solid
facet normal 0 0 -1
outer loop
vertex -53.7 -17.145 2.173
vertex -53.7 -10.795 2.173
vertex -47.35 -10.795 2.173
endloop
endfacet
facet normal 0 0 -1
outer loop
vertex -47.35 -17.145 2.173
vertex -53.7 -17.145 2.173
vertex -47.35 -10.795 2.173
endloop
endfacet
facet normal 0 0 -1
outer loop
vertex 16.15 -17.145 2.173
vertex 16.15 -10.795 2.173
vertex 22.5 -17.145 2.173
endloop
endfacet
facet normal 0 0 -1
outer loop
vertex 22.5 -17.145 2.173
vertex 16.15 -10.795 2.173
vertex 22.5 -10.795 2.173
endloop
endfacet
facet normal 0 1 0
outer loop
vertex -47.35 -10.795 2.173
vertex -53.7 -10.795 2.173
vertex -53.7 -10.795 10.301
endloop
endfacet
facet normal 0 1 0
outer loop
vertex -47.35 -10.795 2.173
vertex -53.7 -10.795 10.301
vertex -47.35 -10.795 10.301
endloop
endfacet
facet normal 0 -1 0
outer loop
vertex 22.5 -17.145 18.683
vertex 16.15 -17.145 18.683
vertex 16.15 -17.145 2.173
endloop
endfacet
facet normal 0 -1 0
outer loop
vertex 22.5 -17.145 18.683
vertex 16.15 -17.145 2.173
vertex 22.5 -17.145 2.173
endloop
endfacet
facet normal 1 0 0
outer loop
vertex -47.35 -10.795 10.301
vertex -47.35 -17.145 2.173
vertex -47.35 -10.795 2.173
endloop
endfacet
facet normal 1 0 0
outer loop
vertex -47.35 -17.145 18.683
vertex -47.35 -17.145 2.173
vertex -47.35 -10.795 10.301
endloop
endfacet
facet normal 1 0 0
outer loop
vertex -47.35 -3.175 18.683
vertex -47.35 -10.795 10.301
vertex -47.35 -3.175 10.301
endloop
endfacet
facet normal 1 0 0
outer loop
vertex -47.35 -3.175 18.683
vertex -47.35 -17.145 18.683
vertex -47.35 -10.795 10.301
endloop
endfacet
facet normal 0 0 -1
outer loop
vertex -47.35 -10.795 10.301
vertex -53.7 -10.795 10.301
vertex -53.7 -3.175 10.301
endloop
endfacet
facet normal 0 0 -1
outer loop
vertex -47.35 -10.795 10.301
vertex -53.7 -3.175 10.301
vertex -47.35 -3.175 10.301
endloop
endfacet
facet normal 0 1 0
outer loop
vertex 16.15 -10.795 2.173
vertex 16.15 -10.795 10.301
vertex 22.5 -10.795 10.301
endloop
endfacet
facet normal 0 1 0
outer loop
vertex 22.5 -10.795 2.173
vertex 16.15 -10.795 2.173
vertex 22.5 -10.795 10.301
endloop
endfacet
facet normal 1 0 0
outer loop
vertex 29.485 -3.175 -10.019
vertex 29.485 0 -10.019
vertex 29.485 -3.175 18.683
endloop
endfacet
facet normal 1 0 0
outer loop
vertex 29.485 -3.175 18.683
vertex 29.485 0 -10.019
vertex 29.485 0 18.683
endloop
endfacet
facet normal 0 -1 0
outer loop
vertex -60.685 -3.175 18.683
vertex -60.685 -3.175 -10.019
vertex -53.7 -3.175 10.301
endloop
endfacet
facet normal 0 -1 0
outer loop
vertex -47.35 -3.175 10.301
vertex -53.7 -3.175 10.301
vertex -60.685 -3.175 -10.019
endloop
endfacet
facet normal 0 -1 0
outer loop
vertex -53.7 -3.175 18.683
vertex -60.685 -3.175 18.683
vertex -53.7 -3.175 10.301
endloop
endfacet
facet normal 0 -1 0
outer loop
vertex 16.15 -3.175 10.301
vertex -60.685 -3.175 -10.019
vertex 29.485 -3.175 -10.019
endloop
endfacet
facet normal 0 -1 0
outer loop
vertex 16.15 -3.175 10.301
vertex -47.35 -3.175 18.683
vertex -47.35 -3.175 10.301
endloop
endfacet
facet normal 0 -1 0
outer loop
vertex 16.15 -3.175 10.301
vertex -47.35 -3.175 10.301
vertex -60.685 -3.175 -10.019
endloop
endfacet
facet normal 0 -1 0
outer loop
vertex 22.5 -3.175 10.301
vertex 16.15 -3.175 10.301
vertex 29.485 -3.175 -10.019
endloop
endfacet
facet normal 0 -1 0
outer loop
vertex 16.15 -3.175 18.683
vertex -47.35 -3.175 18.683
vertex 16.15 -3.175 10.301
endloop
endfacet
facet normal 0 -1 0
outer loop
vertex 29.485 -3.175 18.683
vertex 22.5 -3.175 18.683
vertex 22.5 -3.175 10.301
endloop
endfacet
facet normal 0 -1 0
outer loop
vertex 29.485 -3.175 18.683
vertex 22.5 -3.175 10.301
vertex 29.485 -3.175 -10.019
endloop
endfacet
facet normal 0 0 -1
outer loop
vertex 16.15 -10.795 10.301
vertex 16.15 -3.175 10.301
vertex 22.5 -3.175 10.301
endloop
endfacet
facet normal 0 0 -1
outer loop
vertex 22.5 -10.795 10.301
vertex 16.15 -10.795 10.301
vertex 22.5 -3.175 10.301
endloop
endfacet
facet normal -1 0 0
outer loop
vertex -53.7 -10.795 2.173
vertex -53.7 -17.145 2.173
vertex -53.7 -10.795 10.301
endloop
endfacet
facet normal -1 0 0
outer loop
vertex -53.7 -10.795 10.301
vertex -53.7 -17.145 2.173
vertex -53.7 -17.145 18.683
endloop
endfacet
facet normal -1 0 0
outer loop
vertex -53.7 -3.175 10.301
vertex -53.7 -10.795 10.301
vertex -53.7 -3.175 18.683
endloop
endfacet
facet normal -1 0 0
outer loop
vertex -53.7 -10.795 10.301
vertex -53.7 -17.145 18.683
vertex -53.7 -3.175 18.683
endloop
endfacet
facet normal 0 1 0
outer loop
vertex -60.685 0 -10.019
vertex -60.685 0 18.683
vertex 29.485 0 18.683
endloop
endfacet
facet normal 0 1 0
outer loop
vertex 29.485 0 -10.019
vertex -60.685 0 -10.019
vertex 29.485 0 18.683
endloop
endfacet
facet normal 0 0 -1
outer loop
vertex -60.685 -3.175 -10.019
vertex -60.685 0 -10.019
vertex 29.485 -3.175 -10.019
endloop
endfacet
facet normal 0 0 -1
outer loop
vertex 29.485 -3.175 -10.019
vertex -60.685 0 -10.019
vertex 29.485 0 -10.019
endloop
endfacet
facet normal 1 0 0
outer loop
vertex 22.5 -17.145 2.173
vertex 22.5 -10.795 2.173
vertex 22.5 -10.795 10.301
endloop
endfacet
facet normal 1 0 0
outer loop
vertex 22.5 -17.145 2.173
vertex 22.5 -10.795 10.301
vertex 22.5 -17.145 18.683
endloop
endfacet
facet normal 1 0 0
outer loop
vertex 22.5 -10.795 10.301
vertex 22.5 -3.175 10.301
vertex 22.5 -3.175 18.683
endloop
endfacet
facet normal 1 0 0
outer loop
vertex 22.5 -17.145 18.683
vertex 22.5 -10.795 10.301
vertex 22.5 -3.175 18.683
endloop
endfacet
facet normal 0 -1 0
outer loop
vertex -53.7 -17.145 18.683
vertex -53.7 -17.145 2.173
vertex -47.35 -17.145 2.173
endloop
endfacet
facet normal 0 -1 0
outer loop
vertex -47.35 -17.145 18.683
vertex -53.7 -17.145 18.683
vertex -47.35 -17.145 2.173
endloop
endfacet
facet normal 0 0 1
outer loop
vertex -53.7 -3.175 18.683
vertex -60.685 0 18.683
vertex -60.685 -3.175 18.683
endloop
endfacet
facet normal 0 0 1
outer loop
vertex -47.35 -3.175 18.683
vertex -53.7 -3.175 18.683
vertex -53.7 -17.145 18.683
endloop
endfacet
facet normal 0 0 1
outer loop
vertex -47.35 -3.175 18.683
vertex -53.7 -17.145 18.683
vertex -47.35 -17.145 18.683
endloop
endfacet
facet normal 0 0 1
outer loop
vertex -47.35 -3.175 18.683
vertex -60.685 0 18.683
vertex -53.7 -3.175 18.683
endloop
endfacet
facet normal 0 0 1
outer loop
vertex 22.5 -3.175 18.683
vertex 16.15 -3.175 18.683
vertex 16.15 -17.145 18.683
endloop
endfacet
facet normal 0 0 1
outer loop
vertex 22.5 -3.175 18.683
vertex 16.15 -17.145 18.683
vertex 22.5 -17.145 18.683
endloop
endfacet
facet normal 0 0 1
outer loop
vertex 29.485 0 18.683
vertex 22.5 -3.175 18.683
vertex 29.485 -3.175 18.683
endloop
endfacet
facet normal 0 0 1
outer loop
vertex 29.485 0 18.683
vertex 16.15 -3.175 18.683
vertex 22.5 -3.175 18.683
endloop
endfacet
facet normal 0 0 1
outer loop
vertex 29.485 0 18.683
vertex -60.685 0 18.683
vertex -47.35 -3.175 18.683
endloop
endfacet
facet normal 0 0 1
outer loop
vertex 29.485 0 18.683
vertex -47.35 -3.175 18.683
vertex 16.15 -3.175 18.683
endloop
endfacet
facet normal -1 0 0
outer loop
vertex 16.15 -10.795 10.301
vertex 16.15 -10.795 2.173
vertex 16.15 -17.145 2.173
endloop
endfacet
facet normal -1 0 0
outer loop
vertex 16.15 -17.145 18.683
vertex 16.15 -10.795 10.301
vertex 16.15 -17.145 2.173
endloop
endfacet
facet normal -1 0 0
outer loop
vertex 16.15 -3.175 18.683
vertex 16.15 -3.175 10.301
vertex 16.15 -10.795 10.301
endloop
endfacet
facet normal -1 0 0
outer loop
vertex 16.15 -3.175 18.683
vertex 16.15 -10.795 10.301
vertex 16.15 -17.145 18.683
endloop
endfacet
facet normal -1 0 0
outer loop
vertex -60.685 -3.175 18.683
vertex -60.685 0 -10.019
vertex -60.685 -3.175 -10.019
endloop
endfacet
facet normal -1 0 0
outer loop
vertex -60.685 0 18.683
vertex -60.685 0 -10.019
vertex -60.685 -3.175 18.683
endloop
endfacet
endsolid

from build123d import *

# Parameters (mm, degrees)
F0_W     = 90.17
F0_H     = 28.702
F1_DEPTH = 3.175
F2_W     = 6.35
F2_H     = 8.382
F3_DEPTH = 7.62
F4_W     = 6.35
F4_H     = 6.35
F5_DEPTH = 16.51


with BuildPart() as f1:
    # F0 (on Front) → F1 (new body)
    with BuildSketch(Plane.XZ):
        with Locations((-15.599873, 4.331834)):
            Rectangle(F0_W, F0_H)
    extrude(amount=F1_DEPTH)

    # F2 (on face) → F3 (join)
    with BuildSketch(Plane.XZ.offset(3.175)):
        with Locations((-50.524873, 14.491834)):
            Rectangle(F2_W, F2_H)
        with Locations((19.325127, 14.491834)):
            Rectangle(F2_W, F2_H)
    extrude(amount=F3_DEPTH)

    # F4 (on face) → F5 (join)
    with BuildSketch(Plane.XY.offset(18.682834)):
        with Locations((-50.524873, -13.97)):
            Rectangle(F4_W, F4_H)
        with Locations((19.325127, -13.97)):
            Rectangle(F4_W, F4_H)
    extrude(amount=-F5_DEPTH)


solid = f1.part
